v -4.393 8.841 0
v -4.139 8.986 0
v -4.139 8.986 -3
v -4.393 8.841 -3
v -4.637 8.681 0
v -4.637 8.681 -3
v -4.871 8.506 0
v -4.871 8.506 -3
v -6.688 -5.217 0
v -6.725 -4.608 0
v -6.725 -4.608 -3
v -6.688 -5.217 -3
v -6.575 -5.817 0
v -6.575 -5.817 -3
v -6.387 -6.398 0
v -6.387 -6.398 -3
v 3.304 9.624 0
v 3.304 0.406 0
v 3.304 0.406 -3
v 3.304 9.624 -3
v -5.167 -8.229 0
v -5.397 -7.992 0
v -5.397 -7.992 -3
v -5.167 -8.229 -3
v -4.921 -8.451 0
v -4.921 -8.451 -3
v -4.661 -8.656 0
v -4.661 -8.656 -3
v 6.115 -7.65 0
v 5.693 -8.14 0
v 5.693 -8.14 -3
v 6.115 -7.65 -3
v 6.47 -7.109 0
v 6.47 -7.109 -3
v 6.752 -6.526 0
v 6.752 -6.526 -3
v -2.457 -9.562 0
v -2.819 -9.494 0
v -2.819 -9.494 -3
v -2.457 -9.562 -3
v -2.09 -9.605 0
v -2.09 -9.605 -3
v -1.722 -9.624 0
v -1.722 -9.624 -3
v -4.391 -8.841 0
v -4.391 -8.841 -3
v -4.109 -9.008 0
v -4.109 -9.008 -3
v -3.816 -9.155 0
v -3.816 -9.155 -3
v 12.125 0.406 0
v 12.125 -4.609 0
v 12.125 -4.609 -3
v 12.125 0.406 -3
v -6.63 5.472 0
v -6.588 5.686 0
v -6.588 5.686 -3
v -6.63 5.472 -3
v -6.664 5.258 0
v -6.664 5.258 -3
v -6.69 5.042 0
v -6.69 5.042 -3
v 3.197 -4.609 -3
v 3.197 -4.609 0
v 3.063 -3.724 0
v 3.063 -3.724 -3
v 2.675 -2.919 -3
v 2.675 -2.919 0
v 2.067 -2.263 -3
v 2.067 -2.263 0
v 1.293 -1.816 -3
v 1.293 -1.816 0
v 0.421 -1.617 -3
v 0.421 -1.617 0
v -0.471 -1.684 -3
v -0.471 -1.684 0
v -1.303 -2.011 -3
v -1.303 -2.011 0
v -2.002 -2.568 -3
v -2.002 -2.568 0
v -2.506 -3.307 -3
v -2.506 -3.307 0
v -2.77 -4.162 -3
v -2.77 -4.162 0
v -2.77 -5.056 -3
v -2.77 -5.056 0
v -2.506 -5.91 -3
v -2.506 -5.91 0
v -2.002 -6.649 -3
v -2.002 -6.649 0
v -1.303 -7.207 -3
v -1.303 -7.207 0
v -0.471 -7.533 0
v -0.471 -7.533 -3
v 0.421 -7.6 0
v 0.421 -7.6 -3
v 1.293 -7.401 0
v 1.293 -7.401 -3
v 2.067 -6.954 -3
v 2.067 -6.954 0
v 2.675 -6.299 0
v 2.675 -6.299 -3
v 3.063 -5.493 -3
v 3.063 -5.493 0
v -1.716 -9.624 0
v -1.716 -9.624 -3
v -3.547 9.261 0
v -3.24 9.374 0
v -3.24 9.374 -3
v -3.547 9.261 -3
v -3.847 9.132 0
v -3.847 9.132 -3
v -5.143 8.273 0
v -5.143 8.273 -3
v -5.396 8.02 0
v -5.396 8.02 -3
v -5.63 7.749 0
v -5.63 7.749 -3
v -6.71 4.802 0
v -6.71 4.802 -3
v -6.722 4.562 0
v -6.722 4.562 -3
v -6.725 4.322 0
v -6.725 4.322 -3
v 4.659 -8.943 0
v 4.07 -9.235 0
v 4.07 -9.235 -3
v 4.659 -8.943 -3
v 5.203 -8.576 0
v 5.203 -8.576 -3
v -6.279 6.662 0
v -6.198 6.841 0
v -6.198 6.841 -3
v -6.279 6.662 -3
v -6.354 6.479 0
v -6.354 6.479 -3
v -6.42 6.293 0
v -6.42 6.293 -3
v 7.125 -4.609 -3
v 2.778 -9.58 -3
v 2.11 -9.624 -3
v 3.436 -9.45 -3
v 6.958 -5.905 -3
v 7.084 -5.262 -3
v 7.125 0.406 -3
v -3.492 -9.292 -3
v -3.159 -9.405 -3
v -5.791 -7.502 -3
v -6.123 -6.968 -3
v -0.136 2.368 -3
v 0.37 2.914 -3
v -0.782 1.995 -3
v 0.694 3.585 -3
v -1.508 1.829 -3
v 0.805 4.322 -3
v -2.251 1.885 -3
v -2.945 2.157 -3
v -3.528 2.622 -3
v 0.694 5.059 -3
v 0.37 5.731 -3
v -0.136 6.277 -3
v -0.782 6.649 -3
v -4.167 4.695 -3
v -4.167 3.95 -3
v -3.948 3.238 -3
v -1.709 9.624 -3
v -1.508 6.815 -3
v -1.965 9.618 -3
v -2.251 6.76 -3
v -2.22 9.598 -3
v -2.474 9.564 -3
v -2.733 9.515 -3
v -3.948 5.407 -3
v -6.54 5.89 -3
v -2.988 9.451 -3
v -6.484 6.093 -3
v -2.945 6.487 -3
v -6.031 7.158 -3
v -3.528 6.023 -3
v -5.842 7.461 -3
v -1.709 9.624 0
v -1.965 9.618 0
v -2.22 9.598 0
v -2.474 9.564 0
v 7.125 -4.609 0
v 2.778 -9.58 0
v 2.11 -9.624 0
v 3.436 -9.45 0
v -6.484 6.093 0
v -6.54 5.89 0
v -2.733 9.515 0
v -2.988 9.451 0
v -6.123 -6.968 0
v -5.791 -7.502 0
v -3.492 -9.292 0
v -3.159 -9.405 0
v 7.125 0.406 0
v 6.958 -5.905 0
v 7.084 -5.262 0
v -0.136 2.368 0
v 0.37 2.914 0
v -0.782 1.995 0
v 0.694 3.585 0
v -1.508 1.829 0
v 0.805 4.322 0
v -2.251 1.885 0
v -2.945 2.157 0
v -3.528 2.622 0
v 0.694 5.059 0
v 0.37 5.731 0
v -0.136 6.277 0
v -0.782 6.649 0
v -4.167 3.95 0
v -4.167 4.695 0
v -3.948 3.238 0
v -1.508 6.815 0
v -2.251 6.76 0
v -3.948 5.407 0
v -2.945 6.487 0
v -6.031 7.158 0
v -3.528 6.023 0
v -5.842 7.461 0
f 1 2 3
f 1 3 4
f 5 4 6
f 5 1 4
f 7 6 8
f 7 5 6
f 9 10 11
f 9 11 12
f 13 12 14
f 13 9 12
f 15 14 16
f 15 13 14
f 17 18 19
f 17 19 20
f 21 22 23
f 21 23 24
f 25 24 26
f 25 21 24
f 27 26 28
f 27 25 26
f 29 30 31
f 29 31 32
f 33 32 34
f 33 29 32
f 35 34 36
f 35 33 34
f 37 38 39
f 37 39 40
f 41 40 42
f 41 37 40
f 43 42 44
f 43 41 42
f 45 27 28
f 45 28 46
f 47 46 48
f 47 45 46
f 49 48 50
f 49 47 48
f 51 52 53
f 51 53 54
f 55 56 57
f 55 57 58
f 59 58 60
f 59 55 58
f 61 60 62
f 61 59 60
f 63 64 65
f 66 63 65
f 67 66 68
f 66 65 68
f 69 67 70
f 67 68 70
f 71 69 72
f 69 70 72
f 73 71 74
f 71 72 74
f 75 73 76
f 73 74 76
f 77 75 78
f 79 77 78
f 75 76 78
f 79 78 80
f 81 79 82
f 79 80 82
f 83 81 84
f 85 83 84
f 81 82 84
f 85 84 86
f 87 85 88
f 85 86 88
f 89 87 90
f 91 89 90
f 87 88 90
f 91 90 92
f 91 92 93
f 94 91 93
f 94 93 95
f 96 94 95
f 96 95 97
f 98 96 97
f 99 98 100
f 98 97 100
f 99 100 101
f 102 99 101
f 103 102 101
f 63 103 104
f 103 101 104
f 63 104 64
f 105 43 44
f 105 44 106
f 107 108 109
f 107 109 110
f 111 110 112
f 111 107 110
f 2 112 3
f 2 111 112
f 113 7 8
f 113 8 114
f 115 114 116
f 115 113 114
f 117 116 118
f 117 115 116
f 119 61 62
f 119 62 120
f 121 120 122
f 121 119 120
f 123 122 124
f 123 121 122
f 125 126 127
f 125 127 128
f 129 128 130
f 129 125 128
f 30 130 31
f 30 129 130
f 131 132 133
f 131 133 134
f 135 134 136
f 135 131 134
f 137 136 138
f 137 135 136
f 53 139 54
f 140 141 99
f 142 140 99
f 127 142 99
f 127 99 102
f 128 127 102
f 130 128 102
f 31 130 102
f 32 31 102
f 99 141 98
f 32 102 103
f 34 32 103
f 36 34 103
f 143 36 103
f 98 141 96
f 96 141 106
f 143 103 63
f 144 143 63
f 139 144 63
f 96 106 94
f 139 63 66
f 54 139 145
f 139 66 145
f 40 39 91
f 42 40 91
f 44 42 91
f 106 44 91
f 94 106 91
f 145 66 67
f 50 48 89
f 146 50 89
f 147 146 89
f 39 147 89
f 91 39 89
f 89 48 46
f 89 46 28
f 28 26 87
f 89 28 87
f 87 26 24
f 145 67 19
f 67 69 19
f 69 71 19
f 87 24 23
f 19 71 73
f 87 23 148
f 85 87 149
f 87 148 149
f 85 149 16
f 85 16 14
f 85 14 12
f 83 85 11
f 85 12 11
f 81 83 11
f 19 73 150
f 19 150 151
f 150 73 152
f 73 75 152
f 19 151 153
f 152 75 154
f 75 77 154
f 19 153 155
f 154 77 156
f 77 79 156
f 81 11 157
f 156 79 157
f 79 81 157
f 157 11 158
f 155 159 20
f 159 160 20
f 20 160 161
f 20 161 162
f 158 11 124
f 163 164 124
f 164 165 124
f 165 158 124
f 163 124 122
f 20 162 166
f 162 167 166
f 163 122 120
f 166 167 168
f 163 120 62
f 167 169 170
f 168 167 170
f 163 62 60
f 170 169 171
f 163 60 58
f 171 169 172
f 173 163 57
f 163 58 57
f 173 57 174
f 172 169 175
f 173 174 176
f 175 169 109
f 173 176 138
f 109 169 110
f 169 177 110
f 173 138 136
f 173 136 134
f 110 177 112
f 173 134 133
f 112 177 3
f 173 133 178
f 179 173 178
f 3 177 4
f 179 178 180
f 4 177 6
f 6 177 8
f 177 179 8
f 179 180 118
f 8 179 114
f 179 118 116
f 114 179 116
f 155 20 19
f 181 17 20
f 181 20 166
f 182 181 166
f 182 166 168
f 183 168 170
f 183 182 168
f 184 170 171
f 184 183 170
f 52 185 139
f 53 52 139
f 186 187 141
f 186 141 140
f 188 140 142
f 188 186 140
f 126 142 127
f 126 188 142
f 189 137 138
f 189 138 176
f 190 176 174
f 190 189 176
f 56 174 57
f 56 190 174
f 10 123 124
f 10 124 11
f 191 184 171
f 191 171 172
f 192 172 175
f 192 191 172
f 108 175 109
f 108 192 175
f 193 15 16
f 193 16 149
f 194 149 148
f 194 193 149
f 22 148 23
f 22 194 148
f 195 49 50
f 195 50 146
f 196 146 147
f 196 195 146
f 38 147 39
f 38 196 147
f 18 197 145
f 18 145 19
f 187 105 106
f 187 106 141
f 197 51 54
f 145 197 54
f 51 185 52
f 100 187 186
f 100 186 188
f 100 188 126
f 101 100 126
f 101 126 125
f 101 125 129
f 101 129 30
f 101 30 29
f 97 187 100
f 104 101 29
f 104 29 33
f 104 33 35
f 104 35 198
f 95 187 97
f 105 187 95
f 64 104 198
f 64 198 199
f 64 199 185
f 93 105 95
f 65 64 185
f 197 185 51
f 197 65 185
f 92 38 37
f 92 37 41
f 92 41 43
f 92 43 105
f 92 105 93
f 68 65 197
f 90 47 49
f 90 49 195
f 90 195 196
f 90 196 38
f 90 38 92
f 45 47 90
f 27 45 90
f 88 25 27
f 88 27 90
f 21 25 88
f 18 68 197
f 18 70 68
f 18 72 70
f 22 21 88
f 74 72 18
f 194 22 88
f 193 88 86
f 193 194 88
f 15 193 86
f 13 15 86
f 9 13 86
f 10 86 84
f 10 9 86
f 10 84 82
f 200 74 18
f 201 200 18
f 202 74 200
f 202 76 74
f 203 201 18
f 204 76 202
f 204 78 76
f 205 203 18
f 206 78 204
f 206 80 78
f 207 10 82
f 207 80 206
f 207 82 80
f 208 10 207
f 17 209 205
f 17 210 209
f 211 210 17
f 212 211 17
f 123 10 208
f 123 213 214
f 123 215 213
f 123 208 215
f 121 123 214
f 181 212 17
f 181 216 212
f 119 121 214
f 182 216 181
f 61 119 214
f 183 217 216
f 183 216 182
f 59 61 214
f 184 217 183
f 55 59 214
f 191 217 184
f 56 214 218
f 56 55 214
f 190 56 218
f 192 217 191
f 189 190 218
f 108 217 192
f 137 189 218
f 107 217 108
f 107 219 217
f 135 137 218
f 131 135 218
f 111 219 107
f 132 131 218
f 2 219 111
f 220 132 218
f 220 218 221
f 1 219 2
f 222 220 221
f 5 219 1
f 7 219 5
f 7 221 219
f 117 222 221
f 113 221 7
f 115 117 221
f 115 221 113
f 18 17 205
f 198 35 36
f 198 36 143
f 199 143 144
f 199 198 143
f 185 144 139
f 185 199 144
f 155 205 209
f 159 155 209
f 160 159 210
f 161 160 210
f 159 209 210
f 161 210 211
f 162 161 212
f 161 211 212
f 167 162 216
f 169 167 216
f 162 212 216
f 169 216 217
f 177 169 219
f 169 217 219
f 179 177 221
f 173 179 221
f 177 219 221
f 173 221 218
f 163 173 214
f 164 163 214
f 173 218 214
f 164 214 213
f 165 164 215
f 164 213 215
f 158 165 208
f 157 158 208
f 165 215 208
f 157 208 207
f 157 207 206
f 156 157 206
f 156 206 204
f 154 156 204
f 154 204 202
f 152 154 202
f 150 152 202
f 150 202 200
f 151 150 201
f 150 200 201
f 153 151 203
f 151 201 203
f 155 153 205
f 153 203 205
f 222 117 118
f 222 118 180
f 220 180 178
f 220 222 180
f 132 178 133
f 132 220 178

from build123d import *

# Parameters (mm, degrees)
F0_R     = 3
F0_R_2   = 2.5
F1_DEPTH = 3
F2_DEPTH = 5


# Not quite as in the source:
# - ends of sketch curves that miss each other by under 0.0002 mm in the source are joined


with BuildPart() as f1:
    # F0 (on Top) → F1 (new body)
    with BuildSketch(Plane.XY):
        with BuildLine():
            Line((-1.7219635134, -9.6237825349), (-1.7162322612, -9.6237825349))
            Line((-1.7162322612, -9.6237825349), (2.1097812593, -9.6237806245))
            ThreePointArc((2.1097812593, -9.6237806245), (3.109244006, -9.5259463757), (4.0703036603, -9.2346361811))
            ThreePointArc((4.0703036603, -9.2346361811), (4.9367767363, -8.7689594925), (5.6928675676, -8.1397082139))
            ThreePointArc((5.6928675676, -8.1397082139), (6.3014355553, -7.384861889), (6.7518423579, -6.5262108466))
            ThreePointArc((6.7518423579, -6.5262108466), (7.0313366054, -5.5856490766), (7.1251796223, -4.6089367858))
            Line((7.1251796223, -4.6089367858), (7.1251795967, 0.4059089633))
            Line((7.1251795967, 0.4059089633), (3.3043447402, 0.4059089633))
            Line((3.3043447402, 0.4059089633), (3.3043447402, 9.6236730545))
            Line((3.3043447402, 9.6236730545), (-1.7092449094, 9.6236835618))
            ThreePointArc((-1.7092449094, 9.6236835618), (-2.0928177445, 9.6100571875), (-2.4738865464, 9.5642275806))
            ThreePointArc((-2.4738865464, 9.5642275806), (-2.8609393666, 9.4846946207), (-3.2402037336, 9.3738166285))
            ThreePointArc((-3.2402037336, 9.3738166285), (-3.6975405848, 9.1984368029), (-4.1390265018, 8.9862923546))
            ThreePointArc((-4.1390265018, 8.9862923546), (-4.5162413892, 8.7629757089), (-4.8714990411, 8.5061617901))
            ThreePointArc((-4.8714990411, 8.5061617901), (-5.2720148148, 8.1490003263), (-5.6296128286, 7.7488742742))
            ThreePointArc((-5.6296128286, 7.7488742742), (-5.9394367718, 7.3112544614), (-6.197789407, 6.8414078072))
            ThreePointArc((-6.197789407, 6.8414078072), (-6.3173685837, 6.5707517714), (-6.4204719372, 6.2934007888))
            ThreePointArc((-6.4204719372, 6.2934007888), (-6.5129249786, 5.9920188156), (-6.5882375678, 5.6859033621))
            ThreePointArc((-6.5882375678, 5.6859033621), (-6.6481890942, 5.3652316519), (-6.6899638063, 5.0416896752))
            ThreePointArc((-6.6899638063, 5.0416896752), (-6.7168439977, 4.6824291061), (-6.7253469337, 4.3222646908))
            Line((-6.7253469337, 4.3222646908), (-6.7253324298, -4.6083307059))
            ThreePointArc((-6.7253324298, -4.6083307059), (-6.6405112105, -5.5189445936), (-6.3874853783, -6.3978019019))
            ThreePointArc((-6.3874853783, -6.3978019019), (-5.9650696712, -7.2398337428), (-5.3973270448, -7.9915790132))
            ThreePointArc((-5.3973270448, -7.9915790132), (-5.0455065065, -8.3419922854), (-4.6606937322, -8.6558175446))
            ThreePointArc((-4.6606937322, -8.6558175446), (-4.2509916029, -8.9267871137), (-3.8162055499, -9.1553509281))
            ThreePointArc((-3.8162055499, -9.1553509281), (-3.3266240966, -9.3511061983), (-2.8189514749, -9.4935092865))
            ThreePointArc((-2.8189514749, -9.4935092865), (-2.2737789347, -9.586614675), (-1.7219635134, -9.6237825349))
        make_face()
        with Locations((0.1967744991, -4.6086336082)):
            Circle(F0_R, mode=Mode.SUBTRACT)
        with Locations((-1.6951942668, 4.3222646911)):
            Circle(F0_R_2, mode=Mode.SUBTRACT)
    extrude(amount=-F1_DEPTH)

    # F2 (add): a face of the model
    f2_faces = [f1.faces().sort_by_distance(p)[0] for p in [
        (7.1251796095, -2.1015139113, -1.5),
    ]]
    extrude(f2_faces, amount=F2_DEPTH)


solid = f1.part
